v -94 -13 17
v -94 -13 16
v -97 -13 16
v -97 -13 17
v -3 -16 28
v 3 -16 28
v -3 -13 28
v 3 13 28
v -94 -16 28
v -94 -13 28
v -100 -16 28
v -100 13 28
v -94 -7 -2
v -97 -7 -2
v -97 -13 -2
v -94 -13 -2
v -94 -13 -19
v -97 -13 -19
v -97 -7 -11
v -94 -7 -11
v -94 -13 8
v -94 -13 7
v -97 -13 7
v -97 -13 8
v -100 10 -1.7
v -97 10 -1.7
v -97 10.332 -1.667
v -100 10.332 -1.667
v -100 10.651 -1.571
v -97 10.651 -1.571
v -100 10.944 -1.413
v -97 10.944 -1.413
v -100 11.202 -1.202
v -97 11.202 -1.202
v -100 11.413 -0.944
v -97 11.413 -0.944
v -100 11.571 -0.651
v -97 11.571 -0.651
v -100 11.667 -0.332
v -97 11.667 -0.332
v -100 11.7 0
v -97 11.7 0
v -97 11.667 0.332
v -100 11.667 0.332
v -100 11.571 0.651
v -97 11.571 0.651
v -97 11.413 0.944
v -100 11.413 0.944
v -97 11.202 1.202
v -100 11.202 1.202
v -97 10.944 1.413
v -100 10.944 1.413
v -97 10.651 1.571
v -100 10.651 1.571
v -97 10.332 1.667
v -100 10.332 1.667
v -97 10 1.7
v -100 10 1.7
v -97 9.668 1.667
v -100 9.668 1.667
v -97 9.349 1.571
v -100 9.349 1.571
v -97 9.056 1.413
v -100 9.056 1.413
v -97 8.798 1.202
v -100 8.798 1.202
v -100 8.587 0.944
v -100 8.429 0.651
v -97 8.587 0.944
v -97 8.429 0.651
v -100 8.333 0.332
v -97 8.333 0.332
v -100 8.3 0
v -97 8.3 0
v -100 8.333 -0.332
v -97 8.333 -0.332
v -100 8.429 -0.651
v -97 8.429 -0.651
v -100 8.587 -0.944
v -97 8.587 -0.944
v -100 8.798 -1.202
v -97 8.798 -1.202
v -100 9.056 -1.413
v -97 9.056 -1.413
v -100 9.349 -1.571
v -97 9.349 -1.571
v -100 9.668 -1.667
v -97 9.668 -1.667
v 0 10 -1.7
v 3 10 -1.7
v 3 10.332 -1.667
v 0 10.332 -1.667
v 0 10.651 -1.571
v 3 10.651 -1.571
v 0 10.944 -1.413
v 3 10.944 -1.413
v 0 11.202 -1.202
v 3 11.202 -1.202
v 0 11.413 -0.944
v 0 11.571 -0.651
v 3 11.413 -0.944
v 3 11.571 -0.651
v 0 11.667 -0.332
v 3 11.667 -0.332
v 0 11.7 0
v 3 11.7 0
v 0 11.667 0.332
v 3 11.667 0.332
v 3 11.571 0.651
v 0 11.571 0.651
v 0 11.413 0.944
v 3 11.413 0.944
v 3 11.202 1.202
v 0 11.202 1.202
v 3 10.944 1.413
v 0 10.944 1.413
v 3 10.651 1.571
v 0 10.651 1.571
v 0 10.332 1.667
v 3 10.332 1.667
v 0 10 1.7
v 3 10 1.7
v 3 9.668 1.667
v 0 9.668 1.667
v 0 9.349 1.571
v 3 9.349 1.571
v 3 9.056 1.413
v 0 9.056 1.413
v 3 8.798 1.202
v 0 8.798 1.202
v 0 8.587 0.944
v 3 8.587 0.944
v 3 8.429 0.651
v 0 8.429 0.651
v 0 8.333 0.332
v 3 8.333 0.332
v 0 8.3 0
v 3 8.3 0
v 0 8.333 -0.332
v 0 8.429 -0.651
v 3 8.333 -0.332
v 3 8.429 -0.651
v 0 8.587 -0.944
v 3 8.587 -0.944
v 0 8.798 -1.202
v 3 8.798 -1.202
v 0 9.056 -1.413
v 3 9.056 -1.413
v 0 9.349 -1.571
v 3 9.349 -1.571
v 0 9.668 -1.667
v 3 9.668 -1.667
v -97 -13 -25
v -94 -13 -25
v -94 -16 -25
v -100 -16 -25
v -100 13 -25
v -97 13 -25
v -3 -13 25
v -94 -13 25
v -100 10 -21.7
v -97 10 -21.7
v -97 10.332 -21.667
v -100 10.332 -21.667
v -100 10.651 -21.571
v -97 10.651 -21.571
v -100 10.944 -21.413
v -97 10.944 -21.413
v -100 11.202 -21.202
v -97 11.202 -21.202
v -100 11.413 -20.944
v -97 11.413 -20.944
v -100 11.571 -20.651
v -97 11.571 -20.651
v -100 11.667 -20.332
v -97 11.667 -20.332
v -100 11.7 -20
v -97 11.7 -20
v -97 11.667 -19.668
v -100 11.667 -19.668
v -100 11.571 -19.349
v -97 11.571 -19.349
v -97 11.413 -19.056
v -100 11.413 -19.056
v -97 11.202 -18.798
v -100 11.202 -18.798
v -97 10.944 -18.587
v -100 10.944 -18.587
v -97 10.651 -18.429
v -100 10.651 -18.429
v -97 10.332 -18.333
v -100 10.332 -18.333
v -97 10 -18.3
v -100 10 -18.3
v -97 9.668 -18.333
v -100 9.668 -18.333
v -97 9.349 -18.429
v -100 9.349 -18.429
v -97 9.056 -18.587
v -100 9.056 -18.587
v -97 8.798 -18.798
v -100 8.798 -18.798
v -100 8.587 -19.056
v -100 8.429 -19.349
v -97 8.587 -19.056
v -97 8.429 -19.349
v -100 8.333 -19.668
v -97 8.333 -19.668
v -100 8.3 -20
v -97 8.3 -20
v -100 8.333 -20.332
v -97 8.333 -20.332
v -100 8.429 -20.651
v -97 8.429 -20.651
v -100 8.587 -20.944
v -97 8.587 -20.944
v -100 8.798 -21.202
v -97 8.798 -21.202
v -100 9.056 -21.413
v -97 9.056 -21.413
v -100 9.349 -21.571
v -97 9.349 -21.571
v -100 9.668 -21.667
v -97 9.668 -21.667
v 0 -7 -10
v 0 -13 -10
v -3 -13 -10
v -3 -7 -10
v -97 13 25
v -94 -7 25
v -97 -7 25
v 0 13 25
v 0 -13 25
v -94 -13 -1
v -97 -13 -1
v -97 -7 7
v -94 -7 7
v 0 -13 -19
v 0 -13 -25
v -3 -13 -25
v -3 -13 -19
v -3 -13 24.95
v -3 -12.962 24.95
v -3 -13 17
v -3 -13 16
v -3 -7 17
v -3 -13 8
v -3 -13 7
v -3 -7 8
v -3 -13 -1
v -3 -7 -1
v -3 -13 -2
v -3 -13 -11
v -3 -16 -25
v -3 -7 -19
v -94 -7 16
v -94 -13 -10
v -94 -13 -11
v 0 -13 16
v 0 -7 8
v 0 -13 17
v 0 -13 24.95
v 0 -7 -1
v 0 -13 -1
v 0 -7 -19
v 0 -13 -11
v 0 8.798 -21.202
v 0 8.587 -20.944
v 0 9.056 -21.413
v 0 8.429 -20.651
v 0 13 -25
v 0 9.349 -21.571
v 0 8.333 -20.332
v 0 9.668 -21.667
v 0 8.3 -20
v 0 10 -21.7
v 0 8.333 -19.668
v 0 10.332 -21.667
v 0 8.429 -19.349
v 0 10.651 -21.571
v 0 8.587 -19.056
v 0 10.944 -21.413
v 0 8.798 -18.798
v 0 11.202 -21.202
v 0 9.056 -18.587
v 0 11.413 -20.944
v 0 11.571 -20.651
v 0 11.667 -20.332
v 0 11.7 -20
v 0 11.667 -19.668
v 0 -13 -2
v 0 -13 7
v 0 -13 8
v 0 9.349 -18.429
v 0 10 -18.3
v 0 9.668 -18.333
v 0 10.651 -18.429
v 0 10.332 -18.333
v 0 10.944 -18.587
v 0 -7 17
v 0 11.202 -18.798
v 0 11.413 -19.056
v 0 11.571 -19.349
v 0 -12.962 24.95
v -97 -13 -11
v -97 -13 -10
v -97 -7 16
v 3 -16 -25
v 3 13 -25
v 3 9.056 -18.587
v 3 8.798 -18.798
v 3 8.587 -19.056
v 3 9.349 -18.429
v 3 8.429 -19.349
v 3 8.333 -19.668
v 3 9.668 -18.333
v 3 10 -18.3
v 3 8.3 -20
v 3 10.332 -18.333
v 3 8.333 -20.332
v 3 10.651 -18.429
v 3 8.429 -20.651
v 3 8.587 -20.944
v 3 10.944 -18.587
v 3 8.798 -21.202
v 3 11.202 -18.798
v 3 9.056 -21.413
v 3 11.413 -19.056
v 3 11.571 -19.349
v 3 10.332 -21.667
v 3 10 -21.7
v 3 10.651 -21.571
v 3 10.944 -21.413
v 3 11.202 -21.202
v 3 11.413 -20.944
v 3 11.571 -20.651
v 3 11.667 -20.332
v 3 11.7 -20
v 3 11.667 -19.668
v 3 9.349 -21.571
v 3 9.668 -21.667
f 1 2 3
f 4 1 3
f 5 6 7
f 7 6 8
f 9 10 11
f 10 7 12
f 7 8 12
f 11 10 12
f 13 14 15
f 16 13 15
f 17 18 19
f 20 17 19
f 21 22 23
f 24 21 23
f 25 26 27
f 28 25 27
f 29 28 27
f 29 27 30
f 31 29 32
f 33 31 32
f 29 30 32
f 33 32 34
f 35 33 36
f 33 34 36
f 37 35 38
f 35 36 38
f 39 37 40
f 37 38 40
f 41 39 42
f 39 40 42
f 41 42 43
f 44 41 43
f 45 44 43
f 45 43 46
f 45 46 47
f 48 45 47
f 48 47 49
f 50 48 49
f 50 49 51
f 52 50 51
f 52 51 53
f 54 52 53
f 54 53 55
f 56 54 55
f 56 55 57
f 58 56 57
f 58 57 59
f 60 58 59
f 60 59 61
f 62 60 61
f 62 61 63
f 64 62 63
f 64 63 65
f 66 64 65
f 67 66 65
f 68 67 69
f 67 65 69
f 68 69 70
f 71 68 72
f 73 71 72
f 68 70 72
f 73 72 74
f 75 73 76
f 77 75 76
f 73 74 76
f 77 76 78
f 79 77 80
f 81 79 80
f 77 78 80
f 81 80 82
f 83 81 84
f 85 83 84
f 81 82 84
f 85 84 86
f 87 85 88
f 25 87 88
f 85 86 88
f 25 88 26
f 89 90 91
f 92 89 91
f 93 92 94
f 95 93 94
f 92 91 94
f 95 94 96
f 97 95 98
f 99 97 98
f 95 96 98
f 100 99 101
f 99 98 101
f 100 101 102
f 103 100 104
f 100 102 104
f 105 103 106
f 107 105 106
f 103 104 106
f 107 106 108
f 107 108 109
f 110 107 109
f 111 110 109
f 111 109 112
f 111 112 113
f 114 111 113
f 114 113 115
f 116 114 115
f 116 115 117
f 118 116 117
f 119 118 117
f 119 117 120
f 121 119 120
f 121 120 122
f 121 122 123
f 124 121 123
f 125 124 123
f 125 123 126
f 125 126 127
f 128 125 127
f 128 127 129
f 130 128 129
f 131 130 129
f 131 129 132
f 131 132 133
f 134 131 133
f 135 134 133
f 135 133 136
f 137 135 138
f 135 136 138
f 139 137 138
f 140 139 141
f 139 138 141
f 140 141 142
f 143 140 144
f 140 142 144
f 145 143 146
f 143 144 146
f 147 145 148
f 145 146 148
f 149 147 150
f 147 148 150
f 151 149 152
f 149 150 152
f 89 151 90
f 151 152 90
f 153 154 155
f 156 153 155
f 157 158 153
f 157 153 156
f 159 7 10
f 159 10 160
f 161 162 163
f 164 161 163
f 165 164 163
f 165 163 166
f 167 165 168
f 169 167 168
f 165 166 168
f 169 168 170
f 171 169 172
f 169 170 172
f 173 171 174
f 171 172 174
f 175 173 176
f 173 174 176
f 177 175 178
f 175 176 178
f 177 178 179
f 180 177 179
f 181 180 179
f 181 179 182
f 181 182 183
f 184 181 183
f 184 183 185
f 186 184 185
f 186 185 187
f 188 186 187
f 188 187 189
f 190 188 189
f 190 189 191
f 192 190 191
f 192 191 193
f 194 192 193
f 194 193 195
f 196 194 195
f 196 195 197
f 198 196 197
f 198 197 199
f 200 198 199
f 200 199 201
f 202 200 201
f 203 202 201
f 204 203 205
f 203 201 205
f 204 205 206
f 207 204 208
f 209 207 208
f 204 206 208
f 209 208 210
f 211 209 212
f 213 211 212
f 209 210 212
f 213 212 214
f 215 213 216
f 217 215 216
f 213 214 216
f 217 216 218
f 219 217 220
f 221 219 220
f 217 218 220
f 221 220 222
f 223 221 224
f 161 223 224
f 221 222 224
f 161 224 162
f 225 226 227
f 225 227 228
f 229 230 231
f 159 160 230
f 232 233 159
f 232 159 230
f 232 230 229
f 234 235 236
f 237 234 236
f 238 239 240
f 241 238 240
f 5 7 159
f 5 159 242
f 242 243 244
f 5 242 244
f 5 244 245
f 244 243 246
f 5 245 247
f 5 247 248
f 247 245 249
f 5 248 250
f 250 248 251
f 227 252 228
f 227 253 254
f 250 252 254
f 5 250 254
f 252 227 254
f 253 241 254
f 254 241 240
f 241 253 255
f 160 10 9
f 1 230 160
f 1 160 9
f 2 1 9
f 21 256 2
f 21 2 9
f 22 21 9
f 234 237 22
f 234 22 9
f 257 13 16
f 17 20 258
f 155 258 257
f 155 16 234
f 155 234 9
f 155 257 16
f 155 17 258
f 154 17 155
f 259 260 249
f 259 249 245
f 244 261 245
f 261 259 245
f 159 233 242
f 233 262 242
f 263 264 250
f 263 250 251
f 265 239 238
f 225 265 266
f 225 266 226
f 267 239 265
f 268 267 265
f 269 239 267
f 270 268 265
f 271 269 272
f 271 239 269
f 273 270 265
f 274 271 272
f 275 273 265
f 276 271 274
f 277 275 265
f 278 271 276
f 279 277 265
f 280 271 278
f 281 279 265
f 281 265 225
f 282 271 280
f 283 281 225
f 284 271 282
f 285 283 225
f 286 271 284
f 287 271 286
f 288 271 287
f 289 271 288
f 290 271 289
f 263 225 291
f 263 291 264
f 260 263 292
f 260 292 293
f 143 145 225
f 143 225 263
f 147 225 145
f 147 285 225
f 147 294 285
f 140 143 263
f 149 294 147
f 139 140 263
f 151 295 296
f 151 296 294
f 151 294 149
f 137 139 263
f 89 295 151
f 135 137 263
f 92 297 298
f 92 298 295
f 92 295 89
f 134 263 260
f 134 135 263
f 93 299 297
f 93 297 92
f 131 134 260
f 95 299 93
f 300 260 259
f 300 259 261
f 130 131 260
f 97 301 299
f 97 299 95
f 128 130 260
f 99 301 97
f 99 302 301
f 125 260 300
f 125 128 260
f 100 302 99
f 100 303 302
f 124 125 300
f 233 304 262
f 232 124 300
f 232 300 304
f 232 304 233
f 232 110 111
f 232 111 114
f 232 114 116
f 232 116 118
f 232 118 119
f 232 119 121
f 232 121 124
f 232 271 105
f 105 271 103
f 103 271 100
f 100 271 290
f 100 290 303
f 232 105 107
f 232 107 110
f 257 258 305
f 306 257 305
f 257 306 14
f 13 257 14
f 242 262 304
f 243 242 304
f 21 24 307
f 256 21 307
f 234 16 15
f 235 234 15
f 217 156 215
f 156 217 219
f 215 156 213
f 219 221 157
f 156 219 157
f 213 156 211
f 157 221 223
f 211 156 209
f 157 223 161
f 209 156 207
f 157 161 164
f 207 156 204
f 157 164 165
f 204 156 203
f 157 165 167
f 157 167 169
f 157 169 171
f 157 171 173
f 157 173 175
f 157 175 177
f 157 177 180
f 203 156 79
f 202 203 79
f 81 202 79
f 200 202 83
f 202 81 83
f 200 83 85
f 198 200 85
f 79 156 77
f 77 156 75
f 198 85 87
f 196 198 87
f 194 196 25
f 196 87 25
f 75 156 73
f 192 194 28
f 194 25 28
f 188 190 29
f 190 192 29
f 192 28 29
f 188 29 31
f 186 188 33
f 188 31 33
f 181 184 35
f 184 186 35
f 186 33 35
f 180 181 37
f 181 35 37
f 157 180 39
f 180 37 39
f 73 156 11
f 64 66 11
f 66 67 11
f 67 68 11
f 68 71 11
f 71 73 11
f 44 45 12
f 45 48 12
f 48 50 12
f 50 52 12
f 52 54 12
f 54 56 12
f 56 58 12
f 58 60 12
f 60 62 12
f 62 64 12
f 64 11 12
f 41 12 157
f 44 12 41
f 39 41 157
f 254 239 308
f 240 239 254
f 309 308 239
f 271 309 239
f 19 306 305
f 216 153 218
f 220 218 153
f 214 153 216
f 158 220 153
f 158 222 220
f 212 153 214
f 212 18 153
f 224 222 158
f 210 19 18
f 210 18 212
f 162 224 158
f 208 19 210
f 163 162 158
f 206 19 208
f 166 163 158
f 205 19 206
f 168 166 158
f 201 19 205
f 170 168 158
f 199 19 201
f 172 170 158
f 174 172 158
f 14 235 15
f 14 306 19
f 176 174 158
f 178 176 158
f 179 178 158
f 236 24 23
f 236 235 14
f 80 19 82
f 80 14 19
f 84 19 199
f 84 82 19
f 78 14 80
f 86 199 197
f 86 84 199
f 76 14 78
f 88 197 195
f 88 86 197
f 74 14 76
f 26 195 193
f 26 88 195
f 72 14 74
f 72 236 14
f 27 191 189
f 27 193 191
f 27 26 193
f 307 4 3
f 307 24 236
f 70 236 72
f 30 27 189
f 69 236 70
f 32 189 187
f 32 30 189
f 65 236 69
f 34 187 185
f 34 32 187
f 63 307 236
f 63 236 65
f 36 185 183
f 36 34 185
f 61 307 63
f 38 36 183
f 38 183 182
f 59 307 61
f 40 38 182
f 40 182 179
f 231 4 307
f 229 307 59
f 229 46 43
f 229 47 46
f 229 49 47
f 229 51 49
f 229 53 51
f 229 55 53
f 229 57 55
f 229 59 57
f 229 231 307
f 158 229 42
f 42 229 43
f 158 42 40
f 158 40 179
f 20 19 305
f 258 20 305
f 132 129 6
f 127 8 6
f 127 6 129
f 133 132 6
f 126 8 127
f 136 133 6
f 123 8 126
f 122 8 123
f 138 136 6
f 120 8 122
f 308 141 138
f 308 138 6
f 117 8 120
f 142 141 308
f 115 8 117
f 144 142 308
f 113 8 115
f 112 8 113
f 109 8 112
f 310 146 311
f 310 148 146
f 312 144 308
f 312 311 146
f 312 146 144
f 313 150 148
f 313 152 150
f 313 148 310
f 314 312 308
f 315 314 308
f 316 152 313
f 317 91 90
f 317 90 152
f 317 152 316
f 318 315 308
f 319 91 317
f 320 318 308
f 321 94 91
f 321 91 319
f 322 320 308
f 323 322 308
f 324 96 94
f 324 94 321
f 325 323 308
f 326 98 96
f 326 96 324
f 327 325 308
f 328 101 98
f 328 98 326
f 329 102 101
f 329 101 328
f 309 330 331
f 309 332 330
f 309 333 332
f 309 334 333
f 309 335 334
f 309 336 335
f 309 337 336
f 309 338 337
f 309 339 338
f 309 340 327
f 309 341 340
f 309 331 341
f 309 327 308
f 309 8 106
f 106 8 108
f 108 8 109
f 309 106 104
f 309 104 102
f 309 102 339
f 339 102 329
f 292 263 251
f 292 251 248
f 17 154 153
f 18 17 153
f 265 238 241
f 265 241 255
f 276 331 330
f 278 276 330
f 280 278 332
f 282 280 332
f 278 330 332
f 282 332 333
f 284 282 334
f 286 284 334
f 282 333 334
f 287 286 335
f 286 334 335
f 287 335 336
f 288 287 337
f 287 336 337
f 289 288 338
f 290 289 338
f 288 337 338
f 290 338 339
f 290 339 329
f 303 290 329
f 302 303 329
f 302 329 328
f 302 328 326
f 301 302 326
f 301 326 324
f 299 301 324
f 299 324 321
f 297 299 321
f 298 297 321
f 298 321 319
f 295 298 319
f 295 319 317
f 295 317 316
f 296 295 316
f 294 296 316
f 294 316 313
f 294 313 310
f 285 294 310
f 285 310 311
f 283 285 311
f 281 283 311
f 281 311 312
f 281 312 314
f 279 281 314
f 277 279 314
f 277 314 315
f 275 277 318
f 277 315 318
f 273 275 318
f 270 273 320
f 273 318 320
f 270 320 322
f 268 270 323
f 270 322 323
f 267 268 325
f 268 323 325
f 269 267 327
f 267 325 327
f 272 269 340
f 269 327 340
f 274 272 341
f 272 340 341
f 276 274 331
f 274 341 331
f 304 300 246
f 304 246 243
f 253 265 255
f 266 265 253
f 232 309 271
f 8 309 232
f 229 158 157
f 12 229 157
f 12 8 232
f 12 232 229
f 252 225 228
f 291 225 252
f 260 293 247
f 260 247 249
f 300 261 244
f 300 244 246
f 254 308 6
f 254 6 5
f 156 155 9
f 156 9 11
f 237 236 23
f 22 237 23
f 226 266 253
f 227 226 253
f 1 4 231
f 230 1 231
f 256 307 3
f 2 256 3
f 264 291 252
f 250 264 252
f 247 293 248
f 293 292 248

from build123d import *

# Parameters (mm, degrees)
SKETCH_1_W          = 50
SKETCH_1_H          = 26
EXTRUDE_1_DEPTH     = 3
EXTRUDE_2_DEPTH     = 6
SKETCH_5_W          = 0.1
SKETCH_5_H          = 0.1
CUT_EXTRUDE_1_DEPTH = 3
SKETCH_4_W          = 3
SKETCH_4_H          = 26
EXTRUDE_7_DEPTH     = 103
SKETCH_6_W          = 3
SKETCH_6_H          = 26
EXTRUDE_8_DEPTH     = 50
EXTRUDE_9_DEPTH     = 3
SKETCH_9_W          = 6
SKETCH_9_H          = 53
EXTRUDE_12_DEPTH    = 3
SKETCH_10_R         = 1.7
CUT_EXTRUDE_2_DEPTH = 108.930533215


with BuildPart() as part:
    # 草图1 → 凸台-拉伸1 (new body)
    with BuildSketch(Plane(origin=(0, 0, 0), x_dir=(0, 0, -1), z_dir=(1, 0, 0))):
        Rectangle(SKETCH_1_W, SKETCH_1_H)
    extrude(amount=EXTRUDE_1_DEPTH)

    # 草图2 → 凸台-拉伸2 (add)
    with BuildSketch(Plane(origin=(3, 0, 0), x_dir=(0, 0, -1), z_dir=(1, 0, 0))):
        Polygon((-25, -13), (-17, -13), (-17, -7), align=None)
        Polygon((-8, -7), (-16, -13), (-8, -13), align=None)
        Polygon((1, -7), (-7, -13), (1, -13), align=None)
        Polygon((10, -7), (2, -13), (10, -13), align=None)
        Polygon((19, -7), (11, -13), (19, -13), align=None)
    extrude(amount=-EXTRUDE_2_DEPTH)

    # 草图5 → 切除-拉伸1 (cut)
    with BuildSketch(Plane.ZY):
        with Locations((25, -13)):
            Rectangle(SKETCH_5_W, SKETCH_5_H)
    extrude(amount=CUT_EXTRUDE_1_DEPTH, mode=Mode.SUBTRACT)

    # 草图4 → 凸台-拉伸7 (add)
    with BuildSketch(Plane(origin=(3, 0, 0), x_dir=(0, 0, -1), z_dir=(1, 0, 0))):
        with Locations((-26.5, 0)):
            Rectangle(SKETCH_4_W, SKETCH_4_H)
    extrude(amount=-EXTRUDE_7_DEPTH)

    # 草图6 → 凸台-拉伸8 (add, through all)
    with BuildSketch(Plane(origin=(0, 0, 25), x_dir=(-1, 0, 0), z_dir=(0, 0, -1))):
        with Locations((98.5, 0)):
            Rectangle(SKETCH_6_W, SKETCH_6_H)
    extrude(amount=EXTRUDE_8_DEPTH)

    # 草图7 → 凸台-拉伸9 (add)
    with BuildSketch(Plane(origin=(-97, 0, 0), x_dir=(0, 0, -1), z_dir=(1, 0, 0))):
        Polygon((-25, -7), (-25, -13), (-17, -13), align=None)
        Polygon((-8, -13), (-16, -7), (-16, -13), align=None)
        Polygon((1, -13), (-7, -7), (-7, -13), align=None)
        Polygon((10, -13), (2, -7), (2, -13), align=None)
        Polygon((19, -13), (11, -7), (11, -13), align=None)
    extrude(amount=EXTRUDE_9_DEPTH)

    # 草图9 → 凸台-拉伸12 (add)
    with BuildSketch(Plane(origin=(0, -13, 0), x_dir=(-1, 0, 0), z_dir=(0, -1, 0))):
        with Locations((0, -1.5)):
            Rectangle(SKETCH_9_W, SKETCH_9_H)
        with Locations((97, -1.5)):
            Rectangle(SKETCH_9_W, SKETCH_9_H)
    extrude(amount=EXTRUDE_12_DEPTH)

    # 草图10 → 切除-拉伸2 (cut, through all)
    with BuildSketch(Plane(origin=(3, 0, 0), x_dir=(0, 0, -1), z_dir=(1, 0, 0))):
        with Locations((20, 10)):
            Circle(SKETCH_10_R)
        with Locations((0, 10)):
            Circle(SKETCH_10_R)
    extrude(amount=-CUT_EXTRUDE_2_DEPTH, mode=Mode.SUBTRACT)


solid = part.part
